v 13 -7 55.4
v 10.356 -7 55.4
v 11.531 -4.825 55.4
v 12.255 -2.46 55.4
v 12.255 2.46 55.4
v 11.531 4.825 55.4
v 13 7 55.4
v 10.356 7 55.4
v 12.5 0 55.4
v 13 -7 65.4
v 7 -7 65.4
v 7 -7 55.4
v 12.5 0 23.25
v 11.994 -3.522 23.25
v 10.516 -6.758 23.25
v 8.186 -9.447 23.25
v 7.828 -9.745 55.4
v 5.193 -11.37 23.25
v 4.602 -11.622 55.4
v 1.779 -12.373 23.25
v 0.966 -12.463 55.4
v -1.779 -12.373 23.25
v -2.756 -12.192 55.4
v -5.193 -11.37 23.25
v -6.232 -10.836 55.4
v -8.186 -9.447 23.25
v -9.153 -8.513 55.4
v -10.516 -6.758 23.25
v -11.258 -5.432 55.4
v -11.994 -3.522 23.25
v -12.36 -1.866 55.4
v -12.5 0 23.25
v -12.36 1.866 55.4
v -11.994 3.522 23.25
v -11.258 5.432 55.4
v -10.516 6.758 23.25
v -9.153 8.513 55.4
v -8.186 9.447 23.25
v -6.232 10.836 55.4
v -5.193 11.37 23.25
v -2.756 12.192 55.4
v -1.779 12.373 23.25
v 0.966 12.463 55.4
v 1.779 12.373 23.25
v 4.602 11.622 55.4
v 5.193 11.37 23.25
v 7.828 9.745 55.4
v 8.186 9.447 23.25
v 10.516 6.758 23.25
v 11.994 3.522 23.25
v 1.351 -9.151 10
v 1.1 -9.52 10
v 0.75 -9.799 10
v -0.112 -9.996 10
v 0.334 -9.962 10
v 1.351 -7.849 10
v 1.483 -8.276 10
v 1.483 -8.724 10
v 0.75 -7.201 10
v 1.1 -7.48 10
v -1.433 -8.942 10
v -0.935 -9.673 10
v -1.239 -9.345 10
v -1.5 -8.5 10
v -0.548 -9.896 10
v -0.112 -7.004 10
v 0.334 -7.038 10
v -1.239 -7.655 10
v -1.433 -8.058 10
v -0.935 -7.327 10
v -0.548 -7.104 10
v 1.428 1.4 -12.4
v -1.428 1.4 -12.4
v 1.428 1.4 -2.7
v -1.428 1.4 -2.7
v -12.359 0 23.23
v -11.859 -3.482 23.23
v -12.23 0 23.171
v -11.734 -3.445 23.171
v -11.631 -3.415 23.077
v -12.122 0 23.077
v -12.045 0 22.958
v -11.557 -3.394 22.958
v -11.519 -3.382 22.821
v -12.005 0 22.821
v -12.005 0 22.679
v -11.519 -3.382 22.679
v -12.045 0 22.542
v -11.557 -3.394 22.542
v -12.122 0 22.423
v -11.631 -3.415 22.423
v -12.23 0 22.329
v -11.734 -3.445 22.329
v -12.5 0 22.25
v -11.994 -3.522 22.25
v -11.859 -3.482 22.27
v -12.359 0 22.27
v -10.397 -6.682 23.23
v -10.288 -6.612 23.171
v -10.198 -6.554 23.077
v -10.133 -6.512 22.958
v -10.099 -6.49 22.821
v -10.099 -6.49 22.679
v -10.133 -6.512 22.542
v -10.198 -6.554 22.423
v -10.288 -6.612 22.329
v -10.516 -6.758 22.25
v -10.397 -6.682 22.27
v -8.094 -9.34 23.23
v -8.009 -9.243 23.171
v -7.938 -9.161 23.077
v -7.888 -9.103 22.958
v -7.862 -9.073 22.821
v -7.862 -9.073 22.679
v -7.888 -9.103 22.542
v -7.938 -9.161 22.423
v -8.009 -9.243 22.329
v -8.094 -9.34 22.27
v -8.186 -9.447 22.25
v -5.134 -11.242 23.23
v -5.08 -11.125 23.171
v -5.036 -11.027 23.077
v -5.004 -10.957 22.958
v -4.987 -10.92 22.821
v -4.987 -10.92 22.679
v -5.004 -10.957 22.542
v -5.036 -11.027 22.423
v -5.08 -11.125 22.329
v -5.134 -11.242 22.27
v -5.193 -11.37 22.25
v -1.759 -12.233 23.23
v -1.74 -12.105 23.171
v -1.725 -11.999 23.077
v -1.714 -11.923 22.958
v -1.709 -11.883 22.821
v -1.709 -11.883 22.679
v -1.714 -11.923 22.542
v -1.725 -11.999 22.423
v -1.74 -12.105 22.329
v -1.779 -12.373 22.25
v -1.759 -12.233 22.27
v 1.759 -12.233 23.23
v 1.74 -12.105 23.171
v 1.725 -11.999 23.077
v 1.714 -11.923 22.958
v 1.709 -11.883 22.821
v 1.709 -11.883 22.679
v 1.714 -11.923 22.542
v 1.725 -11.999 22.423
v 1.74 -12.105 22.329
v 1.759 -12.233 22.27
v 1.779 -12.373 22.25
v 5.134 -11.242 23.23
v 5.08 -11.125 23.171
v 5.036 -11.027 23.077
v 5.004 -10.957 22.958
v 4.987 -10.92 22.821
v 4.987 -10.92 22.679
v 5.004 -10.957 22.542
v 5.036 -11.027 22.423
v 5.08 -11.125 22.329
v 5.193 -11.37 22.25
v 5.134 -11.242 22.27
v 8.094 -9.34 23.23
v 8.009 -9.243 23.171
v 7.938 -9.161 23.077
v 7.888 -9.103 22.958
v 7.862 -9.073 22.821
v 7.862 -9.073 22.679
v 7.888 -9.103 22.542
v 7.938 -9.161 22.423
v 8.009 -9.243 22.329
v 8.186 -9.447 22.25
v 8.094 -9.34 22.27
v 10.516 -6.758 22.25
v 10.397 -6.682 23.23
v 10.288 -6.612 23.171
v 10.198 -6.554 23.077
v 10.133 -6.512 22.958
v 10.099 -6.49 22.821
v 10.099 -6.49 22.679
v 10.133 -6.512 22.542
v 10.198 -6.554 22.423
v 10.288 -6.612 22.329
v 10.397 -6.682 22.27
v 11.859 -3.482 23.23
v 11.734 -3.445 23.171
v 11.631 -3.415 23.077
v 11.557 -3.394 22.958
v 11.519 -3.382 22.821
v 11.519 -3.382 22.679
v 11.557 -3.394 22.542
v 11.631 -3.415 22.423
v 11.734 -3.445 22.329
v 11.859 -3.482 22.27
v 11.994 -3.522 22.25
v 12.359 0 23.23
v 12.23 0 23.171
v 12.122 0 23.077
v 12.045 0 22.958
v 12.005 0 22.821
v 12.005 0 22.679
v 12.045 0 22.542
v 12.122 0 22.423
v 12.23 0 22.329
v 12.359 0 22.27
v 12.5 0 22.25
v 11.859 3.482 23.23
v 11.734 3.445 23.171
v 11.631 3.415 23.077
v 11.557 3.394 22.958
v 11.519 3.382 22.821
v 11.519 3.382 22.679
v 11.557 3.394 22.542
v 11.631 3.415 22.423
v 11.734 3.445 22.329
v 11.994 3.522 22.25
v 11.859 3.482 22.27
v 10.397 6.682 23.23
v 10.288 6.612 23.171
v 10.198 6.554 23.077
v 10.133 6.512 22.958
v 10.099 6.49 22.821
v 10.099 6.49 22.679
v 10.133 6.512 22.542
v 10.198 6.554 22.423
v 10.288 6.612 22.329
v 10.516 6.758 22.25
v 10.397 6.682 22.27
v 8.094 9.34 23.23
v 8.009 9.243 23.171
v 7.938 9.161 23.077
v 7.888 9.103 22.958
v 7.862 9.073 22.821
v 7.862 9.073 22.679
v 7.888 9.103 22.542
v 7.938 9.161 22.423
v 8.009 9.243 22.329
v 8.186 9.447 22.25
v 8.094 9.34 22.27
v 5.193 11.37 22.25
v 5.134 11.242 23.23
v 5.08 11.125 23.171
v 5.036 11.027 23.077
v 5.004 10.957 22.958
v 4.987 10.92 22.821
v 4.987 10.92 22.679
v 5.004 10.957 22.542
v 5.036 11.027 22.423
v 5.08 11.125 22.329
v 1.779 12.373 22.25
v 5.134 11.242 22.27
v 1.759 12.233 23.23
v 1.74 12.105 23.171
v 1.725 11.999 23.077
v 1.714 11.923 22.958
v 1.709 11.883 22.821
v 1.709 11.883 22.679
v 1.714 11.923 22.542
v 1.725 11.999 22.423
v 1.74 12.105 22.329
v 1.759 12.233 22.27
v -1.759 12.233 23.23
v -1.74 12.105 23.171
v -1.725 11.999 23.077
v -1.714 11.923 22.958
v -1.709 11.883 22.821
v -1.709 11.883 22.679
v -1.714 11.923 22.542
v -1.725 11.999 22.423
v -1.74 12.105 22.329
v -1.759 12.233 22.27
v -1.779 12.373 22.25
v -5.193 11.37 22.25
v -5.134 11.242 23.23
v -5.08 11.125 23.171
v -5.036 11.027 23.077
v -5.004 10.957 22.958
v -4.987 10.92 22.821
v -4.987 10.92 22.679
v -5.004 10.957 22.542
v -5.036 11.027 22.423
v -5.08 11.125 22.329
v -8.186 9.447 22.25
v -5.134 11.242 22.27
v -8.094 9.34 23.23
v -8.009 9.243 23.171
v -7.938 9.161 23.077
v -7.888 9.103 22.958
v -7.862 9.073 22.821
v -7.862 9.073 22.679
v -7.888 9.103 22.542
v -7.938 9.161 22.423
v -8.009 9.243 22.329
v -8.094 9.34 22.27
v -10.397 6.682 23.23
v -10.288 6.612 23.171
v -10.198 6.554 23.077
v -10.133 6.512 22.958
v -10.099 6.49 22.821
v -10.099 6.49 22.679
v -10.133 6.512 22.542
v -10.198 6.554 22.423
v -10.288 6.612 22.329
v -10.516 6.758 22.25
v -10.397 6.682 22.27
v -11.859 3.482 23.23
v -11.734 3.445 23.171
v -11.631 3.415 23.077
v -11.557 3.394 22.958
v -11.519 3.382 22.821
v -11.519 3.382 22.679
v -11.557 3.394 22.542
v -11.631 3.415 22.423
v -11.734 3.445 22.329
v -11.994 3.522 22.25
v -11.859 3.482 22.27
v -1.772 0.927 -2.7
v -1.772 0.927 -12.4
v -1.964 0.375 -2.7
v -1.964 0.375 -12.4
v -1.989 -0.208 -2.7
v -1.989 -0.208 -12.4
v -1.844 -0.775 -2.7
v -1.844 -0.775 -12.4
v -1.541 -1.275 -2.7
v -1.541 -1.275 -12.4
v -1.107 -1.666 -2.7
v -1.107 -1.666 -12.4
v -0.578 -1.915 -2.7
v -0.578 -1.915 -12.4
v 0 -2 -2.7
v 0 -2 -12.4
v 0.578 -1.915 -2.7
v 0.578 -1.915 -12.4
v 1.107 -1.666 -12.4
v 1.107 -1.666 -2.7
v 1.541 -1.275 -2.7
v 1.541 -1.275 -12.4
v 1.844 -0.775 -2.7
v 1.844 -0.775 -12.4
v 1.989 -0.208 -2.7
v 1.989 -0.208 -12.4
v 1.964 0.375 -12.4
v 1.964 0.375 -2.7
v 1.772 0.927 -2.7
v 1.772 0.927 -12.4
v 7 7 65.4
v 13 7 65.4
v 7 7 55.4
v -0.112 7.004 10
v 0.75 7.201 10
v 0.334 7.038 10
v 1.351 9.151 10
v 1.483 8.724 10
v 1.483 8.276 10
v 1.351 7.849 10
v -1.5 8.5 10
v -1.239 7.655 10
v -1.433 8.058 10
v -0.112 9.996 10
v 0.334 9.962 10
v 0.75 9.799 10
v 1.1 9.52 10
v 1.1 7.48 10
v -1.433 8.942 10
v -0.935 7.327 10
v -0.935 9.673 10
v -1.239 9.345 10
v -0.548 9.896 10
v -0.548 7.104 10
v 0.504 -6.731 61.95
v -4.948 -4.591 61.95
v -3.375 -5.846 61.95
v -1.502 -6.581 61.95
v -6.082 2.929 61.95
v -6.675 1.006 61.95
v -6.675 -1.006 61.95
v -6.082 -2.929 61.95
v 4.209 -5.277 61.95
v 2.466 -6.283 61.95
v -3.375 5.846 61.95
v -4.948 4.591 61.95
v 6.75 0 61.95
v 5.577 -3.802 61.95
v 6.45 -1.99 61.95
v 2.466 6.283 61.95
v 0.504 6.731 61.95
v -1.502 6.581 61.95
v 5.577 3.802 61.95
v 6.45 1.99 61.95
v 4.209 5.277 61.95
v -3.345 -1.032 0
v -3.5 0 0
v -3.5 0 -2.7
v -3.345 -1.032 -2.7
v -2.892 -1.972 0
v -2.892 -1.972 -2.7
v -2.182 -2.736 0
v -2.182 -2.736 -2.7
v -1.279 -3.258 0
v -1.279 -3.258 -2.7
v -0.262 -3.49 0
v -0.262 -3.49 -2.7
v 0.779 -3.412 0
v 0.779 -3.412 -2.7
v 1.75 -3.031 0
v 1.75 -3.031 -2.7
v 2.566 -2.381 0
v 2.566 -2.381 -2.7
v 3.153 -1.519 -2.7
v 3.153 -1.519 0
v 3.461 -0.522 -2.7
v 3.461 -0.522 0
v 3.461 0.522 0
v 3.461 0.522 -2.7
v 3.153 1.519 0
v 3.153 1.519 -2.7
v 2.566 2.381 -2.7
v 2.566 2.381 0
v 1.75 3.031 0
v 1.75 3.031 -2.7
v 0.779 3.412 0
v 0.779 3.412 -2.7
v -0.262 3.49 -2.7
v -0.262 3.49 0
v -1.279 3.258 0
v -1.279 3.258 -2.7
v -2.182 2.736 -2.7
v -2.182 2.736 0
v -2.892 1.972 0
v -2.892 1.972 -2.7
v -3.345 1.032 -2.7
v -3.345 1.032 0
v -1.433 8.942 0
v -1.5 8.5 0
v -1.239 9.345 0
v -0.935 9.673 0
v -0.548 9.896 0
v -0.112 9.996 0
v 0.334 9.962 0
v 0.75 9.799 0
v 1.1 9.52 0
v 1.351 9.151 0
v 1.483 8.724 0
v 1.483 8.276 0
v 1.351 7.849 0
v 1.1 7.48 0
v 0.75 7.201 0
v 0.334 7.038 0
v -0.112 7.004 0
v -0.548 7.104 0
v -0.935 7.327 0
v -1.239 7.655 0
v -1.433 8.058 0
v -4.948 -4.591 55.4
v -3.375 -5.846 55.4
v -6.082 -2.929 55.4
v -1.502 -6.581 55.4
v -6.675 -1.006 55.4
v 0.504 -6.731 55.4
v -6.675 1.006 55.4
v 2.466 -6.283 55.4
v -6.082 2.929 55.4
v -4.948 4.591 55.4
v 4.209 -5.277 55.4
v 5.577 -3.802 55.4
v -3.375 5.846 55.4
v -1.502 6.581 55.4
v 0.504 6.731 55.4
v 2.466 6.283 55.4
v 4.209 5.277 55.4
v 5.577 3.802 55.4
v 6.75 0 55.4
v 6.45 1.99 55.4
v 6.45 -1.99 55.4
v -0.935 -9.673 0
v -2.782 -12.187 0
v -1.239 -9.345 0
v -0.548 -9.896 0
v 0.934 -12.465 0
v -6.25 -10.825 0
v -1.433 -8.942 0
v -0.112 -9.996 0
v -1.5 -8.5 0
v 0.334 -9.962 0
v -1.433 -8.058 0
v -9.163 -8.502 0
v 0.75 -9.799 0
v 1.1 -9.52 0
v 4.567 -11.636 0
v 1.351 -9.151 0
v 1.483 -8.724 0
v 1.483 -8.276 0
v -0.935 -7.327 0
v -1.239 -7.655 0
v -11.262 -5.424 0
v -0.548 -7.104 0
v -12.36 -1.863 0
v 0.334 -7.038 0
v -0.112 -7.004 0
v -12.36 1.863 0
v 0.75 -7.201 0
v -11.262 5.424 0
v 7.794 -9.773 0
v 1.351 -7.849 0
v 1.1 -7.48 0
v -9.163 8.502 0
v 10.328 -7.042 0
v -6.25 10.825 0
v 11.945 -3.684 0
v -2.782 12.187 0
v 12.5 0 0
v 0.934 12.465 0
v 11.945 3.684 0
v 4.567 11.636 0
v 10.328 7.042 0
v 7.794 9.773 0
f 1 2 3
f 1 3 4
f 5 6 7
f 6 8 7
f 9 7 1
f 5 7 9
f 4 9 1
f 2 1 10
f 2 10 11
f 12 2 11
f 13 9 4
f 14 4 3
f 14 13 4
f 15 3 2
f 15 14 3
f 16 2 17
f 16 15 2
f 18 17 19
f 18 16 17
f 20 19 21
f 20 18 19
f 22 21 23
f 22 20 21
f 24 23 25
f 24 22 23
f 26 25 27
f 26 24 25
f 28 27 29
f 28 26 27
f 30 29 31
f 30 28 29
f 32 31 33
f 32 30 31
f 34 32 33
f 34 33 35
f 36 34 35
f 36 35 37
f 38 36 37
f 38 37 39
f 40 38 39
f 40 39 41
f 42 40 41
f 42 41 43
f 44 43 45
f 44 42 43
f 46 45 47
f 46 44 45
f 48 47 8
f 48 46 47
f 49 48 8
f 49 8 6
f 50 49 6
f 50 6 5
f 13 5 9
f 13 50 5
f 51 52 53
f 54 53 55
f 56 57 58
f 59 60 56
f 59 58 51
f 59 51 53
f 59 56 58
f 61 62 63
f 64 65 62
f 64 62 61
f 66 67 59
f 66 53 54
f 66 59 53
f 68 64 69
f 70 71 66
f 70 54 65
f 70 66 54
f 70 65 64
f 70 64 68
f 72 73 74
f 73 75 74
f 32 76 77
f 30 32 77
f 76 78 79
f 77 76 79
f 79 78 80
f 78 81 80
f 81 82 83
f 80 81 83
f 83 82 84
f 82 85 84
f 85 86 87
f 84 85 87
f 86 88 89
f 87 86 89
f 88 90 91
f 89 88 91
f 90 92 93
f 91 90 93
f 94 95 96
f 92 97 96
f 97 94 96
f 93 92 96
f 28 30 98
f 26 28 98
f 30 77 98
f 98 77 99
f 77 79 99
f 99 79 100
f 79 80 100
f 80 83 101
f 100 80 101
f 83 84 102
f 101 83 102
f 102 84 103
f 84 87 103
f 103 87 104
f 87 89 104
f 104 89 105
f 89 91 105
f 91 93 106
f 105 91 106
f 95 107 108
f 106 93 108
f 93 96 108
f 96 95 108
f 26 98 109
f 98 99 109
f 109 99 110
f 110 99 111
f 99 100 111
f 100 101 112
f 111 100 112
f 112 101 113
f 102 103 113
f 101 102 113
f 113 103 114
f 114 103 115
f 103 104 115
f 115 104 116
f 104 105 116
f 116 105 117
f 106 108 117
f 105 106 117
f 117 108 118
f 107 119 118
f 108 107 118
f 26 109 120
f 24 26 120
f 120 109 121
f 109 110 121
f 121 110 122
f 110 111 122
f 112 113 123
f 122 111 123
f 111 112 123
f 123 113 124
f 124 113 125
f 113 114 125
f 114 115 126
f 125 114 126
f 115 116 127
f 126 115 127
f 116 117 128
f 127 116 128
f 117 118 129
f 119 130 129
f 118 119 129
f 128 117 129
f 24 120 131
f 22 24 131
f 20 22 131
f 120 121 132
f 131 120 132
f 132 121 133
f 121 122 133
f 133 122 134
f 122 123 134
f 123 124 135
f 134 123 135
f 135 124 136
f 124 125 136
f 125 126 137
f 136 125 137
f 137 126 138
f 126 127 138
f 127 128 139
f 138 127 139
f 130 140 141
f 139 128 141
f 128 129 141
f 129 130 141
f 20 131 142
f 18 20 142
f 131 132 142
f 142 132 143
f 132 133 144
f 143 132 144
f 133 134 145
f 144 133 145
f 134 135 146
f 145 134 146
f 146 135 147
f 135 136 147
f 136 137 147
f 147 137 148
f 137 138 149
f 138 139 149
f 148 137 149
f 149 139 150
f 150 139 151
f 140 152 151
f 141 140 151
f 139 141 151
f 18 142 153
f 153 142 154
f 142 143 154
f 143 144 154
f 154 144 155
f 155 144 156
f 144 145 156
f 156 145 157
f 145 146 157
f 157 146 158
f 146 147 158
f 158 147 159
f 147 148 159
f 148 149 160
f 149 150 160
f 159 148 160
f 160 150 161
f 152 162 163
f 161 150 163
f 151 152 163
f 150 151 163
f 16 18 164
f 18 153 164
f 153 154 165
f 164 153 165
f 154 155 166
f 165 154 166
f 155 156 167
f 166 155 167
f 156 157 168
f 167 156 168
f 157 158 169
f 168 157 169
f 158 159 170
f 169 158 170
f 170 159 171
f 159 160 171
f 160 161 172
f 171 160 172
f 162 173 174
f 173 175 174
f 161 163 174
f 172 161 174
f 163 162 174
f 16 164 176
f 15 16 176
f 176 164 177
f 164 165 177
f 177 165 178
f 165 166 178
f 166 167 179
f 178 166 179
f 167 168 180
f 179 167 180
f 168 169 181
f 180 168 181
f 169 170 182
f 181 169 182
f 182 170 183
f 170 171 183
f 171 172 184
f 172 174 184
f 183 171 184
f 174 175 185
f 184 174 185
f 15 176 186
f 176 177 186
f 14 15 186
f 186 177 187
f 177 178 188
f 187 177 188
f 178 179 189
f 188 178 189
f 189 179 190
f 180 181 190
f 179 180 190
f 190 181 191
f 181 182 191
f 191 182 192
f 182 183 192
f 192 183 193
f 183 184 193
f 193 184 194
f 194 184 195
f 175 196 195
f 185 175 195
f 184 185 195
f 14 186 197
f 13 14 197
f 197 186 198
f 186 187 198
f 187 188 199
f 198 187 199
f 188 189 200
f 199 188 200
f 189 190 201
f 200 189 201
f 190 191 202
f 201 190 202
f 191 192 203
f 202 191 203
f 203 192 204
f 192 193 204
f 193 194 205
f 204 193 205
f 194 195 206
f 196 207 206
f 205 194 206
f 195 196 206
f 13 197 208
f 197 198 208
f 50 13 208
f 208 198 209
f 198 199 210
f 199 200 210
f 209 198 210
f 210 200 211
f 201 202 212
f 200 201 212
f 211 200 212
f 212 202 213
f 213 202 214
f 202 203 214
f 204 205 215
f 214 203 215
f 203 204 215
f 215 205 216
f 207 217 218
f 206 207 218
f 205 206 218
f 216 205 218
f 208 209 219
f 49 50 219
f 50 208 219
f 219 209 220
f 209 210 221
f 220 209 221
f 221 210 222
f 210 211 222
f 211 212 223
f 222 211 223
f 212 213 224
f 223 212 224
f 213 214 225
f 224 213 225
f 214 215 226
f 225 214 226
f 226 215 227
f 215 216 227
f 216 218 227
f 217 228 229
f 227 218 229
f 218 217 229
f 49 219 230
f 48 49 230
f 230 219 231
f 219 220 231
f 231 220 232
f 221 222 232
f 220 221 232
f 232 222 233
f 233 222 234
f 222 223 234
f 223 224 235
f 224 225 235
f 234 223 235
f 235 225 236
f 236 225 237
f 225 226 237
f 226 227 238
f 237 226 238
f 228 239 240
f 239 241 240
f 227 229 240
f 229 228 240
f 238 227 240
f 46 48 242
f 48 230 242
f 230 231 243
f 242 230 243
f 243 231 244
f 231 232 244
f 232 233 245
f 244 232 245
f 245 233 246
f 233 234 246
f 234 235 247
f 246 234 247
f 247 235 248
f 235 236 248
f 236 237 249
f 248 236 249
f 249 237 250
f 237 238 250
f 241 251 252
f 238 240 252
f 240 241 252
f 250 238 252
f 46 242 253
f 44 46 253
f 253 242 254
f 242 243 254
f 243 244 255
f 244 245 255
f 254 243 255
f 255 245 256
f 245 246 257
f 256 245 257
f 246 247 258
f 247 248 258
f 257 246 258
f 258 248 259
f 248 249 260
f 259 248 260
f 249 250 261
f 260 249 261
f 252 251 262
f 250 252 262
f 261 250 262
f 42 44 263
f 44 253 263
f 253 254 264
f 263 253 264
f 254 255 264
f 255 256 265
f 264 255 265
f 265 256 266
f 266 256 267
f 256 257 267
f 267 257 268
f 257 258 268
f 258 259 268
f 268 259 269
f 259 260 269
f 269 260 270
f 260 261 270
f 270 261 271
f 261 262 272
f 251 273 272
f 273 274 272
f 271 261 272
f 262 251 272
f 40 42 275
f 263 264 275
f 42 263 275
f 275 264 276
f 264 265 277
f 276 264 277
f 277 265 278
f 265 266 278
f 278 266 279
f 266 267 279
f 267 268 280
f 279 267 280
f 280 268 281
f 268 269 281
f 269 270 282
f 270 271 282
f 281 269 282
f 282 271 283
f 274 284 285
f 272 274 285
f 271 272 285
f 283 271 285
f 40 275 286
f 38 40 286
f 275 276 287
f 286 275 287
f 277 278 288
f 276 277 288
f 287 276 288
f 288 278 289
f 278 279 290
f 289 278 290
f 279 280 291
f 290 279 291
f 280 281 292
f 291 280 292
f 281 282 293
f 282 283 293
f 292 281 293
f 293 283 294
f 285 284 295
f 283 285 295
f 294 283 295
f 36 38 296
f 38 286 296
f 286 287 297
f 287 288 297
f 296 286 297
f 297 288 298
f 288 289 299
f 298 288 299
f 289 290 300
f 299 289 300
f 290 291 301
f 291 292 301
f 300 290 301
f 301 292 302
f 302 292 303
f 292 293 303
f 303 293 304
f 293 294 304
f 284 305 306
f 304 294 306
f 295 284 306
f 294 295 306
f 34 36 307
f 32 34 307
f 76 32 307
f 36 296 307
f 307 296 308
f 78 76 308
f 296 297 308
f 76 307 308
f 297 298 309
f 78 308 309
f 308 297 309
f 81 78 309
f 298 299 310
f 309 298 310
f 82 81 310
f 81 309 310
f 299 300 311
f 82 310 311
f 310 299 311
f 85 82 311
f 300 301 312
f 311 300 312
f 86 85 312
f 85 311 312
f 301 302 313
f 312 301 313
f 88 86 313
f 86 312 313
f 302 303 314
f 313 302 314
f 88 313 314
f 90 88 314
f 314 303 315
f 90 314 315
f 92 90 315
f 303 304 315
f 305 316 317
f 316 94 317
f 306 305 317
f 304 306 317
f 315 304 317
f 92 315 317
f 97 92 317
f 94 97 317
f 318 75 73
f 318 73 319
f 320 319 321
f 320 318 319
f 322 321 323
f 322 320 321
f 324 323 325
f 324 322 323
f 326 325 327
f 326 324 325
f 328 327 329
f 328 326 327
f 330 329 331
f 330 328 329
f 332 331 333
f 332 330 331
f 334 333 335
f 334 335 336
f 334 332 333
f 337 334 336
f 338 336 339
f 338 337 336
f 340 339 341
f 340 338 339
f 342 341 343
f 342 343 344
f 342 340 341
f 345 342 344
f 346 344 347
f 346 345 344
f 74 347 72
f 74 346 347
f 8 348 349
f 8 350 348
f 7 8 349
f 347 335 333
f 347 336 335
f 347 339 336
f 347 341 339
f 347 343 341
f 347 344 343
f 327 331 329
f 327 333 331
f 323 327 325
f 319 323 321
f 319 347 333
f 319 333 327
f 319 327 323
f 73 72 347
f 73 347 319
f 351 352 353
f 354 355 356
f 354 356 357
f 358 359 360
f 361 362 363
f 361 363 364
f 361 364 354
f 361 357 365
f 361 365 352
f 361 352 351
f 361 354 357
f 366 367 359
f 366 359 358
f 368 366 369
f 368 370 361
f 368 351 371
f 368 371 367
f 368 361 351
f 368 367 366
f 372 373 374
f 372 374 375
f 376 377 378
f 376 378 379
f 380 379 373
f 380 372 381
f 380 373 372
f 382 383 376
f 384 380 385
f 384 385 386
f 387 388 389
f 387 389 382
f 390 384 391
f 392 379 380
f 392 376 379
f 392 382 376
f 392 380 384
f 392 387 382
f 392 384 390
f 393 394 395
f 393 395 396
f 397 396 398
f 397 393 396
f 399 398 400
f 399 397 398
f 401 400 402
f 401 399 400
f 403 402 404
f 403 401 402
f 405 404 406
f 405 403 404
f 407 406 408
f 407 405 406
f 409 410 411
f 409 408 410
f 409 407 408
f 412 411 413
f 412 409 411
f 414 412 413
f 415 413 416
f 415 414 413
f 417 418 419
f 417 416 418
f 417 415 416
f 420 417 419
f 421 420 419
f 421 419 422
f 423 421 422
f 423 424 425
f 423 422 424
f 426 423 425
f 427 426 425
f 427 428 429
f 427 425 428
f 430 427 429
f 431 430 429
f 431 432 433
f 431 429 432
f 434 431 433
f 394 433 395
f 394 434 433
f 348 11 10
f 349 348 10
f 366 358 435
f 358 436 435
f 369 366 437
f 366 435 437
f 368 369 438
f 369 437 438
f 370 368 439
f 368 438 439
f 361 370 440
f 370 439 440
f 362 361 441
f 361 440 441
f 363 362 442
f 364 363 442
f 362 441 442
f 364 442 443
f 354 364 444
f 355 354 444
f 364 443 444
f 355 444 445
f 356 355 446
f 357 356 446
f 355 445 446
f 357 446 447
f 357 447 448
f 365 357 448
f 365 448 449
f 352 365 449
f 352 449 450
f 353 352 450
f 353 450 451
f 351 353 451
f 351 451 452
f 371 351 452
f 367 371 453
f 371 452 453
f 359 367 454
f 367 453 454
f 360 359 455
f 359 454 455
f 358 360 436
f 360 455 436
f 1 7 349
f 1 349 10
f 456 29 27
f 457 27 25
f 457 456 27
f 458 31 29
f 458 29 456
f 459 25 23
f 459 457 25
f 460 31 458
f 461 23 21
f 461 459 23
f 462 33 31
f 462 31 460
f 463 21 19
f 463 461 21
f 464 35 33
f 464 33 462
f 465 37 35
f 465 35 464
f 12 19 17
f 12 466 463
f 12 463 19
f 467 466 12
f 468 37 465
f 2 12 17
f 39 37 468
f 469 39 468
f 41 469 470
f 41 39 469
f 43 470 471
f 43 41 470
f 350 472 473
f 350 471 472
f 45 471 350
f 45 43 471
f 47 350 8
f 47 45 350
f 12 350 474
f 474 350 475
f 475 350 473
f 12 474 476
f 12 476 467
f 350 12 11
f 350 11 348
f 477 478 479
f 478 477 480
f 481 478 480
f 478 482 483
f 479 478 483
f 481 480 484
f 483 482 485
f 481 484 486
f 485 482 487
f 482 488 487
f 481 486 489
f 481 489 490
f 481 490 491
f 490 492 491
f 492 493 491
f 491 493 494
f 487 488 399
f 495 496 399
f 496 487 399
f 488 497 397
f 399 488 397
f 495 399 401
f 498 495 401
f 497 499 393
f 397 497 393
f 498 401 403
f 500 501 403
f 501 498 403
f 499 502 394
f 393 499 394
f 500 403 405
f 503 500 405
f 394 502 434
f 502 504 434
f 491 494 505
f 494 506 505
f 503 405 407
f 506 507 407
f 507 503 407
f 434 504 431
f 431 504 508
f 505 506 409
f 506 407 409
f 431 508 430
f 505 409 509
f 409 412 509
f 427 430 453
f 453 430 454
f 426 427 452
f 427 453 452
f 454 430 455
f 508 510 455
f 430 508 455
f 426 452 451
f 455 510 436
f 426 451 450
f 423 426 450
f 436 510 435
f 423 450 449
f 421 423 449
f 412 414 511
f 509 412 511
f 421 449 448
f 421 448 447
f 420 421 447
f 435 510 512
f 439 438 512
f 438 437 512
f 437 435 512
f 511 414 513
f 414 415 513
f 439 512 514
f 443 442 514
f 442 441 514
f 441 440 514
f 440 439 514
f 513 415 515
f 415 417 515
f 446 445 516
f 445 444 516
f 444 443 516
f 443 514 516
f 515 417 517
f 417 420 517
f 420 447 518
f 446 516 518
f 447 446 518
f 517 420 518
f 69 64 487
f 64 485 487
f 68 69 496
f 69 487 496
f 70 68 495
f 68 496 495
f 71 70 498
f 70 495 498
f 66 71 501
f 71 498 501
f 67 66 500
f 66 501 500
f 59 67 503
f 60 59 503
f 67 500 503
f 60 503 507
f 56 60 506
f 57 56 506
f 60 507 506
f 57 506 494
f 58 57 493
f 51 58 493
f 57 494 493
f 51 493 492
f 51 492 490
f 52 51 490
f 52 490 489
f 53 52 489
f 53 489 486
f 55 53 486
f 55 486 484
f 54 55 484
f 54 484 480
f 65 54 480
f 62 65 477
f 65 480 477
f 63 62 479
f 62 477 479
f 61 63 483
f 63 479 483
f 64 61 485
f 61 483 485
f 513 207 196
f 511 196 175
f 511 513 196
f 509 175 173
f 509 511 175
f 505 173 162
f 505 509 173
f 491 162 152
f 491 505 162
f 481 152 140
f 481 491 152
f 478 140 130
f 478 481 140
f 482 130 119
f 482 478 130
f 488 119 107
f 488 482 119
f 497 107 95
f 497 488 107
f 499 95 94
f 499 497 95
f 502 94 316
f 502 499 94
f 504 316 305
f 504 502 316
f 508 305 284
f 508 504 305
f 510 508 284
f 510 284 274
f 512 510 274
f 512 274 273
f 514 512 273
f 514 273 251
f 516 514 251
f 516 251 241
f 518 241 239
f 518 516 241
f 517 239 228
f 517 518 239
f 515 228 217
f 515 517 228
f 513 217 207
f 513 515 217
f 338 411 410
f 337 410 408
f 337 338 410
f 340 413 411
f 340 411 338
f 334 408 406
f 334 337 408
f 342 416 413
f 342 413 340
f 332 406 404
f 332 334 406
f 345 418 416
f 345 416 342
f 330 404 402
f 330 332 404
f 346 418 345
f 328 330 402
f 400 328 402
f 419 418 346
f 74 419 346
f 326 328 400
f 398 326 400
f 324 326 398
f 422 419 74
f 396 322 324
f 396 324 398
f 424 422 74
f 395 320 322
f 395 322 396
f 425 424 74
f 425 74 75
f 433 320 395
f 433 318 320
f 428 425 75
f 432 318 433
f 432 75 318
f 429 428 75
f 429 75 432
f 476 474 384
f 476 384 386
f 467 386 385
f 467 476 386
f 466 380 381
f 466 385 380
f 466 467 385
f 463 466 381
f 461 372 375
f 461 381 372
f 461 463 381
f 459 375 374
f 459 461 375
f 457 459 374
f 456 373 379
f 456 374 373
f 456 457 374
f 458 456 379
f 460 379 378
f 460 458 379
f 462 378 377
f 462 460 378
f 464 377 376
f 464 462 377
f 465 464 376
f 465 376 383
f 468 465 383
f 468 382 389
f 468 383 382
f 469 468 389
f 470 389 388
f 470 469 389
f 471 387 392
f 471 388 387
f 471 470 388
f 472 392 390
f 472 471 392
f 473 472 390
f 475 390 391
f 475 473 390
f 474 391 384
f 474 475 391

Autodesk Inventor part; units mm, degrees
ref_plane "YZ Plane" through (0, 0, 0) normal (1, 0, 0) x (0, 1, 0)
ref_plane "XZ Plane" through (0, 0, 0) normal (0, 1, 0) x (-1, 0, 0)
ref_plane "XY Plane" through (0, 0, 0) normal (0, 0, 1) x (1, 0, 0)
sketch "Эскиз1" plane through (0, 0, 0) normal (0, 0, 1) x (1, 0, 0)
  circle A0 centre (0, 0) radius 12.5
  dimension "d0" = 25
extrude "Выдавливание1" add sketch "Эскиз1" along normal blind 55.4
sketch "Эскиз2" plane through (0, 0, 55.4) normal (0, 0, 1) x (1, 0, 0)
  circle A0 centre (0, 0) radius 6.75
  dimension "d3" = 13.5
extrude "Выдавливание2" add sketch "Эскиз2" along normal blind 6.55
sketch "Эскиз3" plane through (0, 0, 55.4) normal (0, 0, 1) x (1, 0, 0)
  line L0 (7, 7) -> (13, 7)
  line L1 (13, 7) -> (13, -7)
  line L2 (13, -7) -> (7, -7)
  line L3 (7, -7) -> (7, 7)
  line L4 (-17.6863, 0) -> (18.6175, 0) projected
  circle A0 centre (0, 0) radius 12.5 projected
  line L5 (-12.5, 0) -> (13, 0)
  point P0 (7, 0)
  dimension "d6" = 6
  dimension "d7" = 14
  dimension "d8" = 25.5
extrude "Выдавливание3" add sketch "Эскиз3" along normal blind 10 contours L0 A0 L4 L3 | L0 L1 L4 A0 | L4 A0 L2 L3 | L4 L1 L2 A0 picked at (8.5105, 3.9415) picked at (8.5105, -3.9415)
sketch "Эскиз4" plane through (0, 0, 0) normal (0, 0, -1) x (-1, 0, 0)
  circle A0 centre (0, 0) radius 3.5
  dimension "d11" = 7
extrude "Выдавливание4" add sketch "Эскиз4" along normal blind 2.7
sketch "Эскиз5" plane through (0, 0, -2.7) normal (0, 0, -1) x (-1, 0, 0)
  circle A0 centre (0, 0) radius 2
  line L0 (1.4283, 1.4) -> (-1.4283, 1.4)
  line L1 (0, -2) -> (0, 1.4)
  dimension "d14" = 4
  dimension "d15" = 3.4
extrude "Выдавливание5" add sketch "Эскиз5" along normal blind 9.7 contours A0 L1 L0 | A0 L0 L1
sketch "Эскиз6" plane through (0, 0, 0) normal (0, 0, -1) x (-1, 0, 0)
  line L0 (0, 8.5) -> (0, -8.5)
  circle A0 centre (0, 8.5) radius 1.5
  circle A1 centre (0, -8.5) radius 1.5
  point P0 (0, 0)
  point P1 (0, 0)
  dimension "d18" = 17
  dimension "d19" = 3
  dimension "d20" = 3
extrude "Выдавливание6" cut sketch "Эскиз6" against normal blind 10
sketch "Эскиз7" plane through (0, 0, 0) normal (0, 1, 0) x (-1, 0, 0)
  line L0 (12.5, 0) -> (-12.5, 0) projected
  line L1 (12.5, 0) -> (12.5, 22.75)
  line L2 (12.5, 0) -> (12.5, 55.4) projected
  circle A0 centre (12.5, 22.75) radius 0.5
  line L3 (-2, -12.4) -> (2, -12.4) projected
  line L4 (0, -12.4) -> (0, 61.95)
  line L5 (6.75, 61.95) -> (-6.75, 61.95) projected
  point P0 (0, 0)
  point P1 (-1.4283, -12.4)
  point P2 (1.4283, -12.4)
  dimension "d23" = 22.75
  dimension "d24" = 1
revolve "Вращение1" cut sketch "Эскиз7" angle 360 about axis through (0, 0, -12.4) along (0, 0, 1)
properties part number "motor"
